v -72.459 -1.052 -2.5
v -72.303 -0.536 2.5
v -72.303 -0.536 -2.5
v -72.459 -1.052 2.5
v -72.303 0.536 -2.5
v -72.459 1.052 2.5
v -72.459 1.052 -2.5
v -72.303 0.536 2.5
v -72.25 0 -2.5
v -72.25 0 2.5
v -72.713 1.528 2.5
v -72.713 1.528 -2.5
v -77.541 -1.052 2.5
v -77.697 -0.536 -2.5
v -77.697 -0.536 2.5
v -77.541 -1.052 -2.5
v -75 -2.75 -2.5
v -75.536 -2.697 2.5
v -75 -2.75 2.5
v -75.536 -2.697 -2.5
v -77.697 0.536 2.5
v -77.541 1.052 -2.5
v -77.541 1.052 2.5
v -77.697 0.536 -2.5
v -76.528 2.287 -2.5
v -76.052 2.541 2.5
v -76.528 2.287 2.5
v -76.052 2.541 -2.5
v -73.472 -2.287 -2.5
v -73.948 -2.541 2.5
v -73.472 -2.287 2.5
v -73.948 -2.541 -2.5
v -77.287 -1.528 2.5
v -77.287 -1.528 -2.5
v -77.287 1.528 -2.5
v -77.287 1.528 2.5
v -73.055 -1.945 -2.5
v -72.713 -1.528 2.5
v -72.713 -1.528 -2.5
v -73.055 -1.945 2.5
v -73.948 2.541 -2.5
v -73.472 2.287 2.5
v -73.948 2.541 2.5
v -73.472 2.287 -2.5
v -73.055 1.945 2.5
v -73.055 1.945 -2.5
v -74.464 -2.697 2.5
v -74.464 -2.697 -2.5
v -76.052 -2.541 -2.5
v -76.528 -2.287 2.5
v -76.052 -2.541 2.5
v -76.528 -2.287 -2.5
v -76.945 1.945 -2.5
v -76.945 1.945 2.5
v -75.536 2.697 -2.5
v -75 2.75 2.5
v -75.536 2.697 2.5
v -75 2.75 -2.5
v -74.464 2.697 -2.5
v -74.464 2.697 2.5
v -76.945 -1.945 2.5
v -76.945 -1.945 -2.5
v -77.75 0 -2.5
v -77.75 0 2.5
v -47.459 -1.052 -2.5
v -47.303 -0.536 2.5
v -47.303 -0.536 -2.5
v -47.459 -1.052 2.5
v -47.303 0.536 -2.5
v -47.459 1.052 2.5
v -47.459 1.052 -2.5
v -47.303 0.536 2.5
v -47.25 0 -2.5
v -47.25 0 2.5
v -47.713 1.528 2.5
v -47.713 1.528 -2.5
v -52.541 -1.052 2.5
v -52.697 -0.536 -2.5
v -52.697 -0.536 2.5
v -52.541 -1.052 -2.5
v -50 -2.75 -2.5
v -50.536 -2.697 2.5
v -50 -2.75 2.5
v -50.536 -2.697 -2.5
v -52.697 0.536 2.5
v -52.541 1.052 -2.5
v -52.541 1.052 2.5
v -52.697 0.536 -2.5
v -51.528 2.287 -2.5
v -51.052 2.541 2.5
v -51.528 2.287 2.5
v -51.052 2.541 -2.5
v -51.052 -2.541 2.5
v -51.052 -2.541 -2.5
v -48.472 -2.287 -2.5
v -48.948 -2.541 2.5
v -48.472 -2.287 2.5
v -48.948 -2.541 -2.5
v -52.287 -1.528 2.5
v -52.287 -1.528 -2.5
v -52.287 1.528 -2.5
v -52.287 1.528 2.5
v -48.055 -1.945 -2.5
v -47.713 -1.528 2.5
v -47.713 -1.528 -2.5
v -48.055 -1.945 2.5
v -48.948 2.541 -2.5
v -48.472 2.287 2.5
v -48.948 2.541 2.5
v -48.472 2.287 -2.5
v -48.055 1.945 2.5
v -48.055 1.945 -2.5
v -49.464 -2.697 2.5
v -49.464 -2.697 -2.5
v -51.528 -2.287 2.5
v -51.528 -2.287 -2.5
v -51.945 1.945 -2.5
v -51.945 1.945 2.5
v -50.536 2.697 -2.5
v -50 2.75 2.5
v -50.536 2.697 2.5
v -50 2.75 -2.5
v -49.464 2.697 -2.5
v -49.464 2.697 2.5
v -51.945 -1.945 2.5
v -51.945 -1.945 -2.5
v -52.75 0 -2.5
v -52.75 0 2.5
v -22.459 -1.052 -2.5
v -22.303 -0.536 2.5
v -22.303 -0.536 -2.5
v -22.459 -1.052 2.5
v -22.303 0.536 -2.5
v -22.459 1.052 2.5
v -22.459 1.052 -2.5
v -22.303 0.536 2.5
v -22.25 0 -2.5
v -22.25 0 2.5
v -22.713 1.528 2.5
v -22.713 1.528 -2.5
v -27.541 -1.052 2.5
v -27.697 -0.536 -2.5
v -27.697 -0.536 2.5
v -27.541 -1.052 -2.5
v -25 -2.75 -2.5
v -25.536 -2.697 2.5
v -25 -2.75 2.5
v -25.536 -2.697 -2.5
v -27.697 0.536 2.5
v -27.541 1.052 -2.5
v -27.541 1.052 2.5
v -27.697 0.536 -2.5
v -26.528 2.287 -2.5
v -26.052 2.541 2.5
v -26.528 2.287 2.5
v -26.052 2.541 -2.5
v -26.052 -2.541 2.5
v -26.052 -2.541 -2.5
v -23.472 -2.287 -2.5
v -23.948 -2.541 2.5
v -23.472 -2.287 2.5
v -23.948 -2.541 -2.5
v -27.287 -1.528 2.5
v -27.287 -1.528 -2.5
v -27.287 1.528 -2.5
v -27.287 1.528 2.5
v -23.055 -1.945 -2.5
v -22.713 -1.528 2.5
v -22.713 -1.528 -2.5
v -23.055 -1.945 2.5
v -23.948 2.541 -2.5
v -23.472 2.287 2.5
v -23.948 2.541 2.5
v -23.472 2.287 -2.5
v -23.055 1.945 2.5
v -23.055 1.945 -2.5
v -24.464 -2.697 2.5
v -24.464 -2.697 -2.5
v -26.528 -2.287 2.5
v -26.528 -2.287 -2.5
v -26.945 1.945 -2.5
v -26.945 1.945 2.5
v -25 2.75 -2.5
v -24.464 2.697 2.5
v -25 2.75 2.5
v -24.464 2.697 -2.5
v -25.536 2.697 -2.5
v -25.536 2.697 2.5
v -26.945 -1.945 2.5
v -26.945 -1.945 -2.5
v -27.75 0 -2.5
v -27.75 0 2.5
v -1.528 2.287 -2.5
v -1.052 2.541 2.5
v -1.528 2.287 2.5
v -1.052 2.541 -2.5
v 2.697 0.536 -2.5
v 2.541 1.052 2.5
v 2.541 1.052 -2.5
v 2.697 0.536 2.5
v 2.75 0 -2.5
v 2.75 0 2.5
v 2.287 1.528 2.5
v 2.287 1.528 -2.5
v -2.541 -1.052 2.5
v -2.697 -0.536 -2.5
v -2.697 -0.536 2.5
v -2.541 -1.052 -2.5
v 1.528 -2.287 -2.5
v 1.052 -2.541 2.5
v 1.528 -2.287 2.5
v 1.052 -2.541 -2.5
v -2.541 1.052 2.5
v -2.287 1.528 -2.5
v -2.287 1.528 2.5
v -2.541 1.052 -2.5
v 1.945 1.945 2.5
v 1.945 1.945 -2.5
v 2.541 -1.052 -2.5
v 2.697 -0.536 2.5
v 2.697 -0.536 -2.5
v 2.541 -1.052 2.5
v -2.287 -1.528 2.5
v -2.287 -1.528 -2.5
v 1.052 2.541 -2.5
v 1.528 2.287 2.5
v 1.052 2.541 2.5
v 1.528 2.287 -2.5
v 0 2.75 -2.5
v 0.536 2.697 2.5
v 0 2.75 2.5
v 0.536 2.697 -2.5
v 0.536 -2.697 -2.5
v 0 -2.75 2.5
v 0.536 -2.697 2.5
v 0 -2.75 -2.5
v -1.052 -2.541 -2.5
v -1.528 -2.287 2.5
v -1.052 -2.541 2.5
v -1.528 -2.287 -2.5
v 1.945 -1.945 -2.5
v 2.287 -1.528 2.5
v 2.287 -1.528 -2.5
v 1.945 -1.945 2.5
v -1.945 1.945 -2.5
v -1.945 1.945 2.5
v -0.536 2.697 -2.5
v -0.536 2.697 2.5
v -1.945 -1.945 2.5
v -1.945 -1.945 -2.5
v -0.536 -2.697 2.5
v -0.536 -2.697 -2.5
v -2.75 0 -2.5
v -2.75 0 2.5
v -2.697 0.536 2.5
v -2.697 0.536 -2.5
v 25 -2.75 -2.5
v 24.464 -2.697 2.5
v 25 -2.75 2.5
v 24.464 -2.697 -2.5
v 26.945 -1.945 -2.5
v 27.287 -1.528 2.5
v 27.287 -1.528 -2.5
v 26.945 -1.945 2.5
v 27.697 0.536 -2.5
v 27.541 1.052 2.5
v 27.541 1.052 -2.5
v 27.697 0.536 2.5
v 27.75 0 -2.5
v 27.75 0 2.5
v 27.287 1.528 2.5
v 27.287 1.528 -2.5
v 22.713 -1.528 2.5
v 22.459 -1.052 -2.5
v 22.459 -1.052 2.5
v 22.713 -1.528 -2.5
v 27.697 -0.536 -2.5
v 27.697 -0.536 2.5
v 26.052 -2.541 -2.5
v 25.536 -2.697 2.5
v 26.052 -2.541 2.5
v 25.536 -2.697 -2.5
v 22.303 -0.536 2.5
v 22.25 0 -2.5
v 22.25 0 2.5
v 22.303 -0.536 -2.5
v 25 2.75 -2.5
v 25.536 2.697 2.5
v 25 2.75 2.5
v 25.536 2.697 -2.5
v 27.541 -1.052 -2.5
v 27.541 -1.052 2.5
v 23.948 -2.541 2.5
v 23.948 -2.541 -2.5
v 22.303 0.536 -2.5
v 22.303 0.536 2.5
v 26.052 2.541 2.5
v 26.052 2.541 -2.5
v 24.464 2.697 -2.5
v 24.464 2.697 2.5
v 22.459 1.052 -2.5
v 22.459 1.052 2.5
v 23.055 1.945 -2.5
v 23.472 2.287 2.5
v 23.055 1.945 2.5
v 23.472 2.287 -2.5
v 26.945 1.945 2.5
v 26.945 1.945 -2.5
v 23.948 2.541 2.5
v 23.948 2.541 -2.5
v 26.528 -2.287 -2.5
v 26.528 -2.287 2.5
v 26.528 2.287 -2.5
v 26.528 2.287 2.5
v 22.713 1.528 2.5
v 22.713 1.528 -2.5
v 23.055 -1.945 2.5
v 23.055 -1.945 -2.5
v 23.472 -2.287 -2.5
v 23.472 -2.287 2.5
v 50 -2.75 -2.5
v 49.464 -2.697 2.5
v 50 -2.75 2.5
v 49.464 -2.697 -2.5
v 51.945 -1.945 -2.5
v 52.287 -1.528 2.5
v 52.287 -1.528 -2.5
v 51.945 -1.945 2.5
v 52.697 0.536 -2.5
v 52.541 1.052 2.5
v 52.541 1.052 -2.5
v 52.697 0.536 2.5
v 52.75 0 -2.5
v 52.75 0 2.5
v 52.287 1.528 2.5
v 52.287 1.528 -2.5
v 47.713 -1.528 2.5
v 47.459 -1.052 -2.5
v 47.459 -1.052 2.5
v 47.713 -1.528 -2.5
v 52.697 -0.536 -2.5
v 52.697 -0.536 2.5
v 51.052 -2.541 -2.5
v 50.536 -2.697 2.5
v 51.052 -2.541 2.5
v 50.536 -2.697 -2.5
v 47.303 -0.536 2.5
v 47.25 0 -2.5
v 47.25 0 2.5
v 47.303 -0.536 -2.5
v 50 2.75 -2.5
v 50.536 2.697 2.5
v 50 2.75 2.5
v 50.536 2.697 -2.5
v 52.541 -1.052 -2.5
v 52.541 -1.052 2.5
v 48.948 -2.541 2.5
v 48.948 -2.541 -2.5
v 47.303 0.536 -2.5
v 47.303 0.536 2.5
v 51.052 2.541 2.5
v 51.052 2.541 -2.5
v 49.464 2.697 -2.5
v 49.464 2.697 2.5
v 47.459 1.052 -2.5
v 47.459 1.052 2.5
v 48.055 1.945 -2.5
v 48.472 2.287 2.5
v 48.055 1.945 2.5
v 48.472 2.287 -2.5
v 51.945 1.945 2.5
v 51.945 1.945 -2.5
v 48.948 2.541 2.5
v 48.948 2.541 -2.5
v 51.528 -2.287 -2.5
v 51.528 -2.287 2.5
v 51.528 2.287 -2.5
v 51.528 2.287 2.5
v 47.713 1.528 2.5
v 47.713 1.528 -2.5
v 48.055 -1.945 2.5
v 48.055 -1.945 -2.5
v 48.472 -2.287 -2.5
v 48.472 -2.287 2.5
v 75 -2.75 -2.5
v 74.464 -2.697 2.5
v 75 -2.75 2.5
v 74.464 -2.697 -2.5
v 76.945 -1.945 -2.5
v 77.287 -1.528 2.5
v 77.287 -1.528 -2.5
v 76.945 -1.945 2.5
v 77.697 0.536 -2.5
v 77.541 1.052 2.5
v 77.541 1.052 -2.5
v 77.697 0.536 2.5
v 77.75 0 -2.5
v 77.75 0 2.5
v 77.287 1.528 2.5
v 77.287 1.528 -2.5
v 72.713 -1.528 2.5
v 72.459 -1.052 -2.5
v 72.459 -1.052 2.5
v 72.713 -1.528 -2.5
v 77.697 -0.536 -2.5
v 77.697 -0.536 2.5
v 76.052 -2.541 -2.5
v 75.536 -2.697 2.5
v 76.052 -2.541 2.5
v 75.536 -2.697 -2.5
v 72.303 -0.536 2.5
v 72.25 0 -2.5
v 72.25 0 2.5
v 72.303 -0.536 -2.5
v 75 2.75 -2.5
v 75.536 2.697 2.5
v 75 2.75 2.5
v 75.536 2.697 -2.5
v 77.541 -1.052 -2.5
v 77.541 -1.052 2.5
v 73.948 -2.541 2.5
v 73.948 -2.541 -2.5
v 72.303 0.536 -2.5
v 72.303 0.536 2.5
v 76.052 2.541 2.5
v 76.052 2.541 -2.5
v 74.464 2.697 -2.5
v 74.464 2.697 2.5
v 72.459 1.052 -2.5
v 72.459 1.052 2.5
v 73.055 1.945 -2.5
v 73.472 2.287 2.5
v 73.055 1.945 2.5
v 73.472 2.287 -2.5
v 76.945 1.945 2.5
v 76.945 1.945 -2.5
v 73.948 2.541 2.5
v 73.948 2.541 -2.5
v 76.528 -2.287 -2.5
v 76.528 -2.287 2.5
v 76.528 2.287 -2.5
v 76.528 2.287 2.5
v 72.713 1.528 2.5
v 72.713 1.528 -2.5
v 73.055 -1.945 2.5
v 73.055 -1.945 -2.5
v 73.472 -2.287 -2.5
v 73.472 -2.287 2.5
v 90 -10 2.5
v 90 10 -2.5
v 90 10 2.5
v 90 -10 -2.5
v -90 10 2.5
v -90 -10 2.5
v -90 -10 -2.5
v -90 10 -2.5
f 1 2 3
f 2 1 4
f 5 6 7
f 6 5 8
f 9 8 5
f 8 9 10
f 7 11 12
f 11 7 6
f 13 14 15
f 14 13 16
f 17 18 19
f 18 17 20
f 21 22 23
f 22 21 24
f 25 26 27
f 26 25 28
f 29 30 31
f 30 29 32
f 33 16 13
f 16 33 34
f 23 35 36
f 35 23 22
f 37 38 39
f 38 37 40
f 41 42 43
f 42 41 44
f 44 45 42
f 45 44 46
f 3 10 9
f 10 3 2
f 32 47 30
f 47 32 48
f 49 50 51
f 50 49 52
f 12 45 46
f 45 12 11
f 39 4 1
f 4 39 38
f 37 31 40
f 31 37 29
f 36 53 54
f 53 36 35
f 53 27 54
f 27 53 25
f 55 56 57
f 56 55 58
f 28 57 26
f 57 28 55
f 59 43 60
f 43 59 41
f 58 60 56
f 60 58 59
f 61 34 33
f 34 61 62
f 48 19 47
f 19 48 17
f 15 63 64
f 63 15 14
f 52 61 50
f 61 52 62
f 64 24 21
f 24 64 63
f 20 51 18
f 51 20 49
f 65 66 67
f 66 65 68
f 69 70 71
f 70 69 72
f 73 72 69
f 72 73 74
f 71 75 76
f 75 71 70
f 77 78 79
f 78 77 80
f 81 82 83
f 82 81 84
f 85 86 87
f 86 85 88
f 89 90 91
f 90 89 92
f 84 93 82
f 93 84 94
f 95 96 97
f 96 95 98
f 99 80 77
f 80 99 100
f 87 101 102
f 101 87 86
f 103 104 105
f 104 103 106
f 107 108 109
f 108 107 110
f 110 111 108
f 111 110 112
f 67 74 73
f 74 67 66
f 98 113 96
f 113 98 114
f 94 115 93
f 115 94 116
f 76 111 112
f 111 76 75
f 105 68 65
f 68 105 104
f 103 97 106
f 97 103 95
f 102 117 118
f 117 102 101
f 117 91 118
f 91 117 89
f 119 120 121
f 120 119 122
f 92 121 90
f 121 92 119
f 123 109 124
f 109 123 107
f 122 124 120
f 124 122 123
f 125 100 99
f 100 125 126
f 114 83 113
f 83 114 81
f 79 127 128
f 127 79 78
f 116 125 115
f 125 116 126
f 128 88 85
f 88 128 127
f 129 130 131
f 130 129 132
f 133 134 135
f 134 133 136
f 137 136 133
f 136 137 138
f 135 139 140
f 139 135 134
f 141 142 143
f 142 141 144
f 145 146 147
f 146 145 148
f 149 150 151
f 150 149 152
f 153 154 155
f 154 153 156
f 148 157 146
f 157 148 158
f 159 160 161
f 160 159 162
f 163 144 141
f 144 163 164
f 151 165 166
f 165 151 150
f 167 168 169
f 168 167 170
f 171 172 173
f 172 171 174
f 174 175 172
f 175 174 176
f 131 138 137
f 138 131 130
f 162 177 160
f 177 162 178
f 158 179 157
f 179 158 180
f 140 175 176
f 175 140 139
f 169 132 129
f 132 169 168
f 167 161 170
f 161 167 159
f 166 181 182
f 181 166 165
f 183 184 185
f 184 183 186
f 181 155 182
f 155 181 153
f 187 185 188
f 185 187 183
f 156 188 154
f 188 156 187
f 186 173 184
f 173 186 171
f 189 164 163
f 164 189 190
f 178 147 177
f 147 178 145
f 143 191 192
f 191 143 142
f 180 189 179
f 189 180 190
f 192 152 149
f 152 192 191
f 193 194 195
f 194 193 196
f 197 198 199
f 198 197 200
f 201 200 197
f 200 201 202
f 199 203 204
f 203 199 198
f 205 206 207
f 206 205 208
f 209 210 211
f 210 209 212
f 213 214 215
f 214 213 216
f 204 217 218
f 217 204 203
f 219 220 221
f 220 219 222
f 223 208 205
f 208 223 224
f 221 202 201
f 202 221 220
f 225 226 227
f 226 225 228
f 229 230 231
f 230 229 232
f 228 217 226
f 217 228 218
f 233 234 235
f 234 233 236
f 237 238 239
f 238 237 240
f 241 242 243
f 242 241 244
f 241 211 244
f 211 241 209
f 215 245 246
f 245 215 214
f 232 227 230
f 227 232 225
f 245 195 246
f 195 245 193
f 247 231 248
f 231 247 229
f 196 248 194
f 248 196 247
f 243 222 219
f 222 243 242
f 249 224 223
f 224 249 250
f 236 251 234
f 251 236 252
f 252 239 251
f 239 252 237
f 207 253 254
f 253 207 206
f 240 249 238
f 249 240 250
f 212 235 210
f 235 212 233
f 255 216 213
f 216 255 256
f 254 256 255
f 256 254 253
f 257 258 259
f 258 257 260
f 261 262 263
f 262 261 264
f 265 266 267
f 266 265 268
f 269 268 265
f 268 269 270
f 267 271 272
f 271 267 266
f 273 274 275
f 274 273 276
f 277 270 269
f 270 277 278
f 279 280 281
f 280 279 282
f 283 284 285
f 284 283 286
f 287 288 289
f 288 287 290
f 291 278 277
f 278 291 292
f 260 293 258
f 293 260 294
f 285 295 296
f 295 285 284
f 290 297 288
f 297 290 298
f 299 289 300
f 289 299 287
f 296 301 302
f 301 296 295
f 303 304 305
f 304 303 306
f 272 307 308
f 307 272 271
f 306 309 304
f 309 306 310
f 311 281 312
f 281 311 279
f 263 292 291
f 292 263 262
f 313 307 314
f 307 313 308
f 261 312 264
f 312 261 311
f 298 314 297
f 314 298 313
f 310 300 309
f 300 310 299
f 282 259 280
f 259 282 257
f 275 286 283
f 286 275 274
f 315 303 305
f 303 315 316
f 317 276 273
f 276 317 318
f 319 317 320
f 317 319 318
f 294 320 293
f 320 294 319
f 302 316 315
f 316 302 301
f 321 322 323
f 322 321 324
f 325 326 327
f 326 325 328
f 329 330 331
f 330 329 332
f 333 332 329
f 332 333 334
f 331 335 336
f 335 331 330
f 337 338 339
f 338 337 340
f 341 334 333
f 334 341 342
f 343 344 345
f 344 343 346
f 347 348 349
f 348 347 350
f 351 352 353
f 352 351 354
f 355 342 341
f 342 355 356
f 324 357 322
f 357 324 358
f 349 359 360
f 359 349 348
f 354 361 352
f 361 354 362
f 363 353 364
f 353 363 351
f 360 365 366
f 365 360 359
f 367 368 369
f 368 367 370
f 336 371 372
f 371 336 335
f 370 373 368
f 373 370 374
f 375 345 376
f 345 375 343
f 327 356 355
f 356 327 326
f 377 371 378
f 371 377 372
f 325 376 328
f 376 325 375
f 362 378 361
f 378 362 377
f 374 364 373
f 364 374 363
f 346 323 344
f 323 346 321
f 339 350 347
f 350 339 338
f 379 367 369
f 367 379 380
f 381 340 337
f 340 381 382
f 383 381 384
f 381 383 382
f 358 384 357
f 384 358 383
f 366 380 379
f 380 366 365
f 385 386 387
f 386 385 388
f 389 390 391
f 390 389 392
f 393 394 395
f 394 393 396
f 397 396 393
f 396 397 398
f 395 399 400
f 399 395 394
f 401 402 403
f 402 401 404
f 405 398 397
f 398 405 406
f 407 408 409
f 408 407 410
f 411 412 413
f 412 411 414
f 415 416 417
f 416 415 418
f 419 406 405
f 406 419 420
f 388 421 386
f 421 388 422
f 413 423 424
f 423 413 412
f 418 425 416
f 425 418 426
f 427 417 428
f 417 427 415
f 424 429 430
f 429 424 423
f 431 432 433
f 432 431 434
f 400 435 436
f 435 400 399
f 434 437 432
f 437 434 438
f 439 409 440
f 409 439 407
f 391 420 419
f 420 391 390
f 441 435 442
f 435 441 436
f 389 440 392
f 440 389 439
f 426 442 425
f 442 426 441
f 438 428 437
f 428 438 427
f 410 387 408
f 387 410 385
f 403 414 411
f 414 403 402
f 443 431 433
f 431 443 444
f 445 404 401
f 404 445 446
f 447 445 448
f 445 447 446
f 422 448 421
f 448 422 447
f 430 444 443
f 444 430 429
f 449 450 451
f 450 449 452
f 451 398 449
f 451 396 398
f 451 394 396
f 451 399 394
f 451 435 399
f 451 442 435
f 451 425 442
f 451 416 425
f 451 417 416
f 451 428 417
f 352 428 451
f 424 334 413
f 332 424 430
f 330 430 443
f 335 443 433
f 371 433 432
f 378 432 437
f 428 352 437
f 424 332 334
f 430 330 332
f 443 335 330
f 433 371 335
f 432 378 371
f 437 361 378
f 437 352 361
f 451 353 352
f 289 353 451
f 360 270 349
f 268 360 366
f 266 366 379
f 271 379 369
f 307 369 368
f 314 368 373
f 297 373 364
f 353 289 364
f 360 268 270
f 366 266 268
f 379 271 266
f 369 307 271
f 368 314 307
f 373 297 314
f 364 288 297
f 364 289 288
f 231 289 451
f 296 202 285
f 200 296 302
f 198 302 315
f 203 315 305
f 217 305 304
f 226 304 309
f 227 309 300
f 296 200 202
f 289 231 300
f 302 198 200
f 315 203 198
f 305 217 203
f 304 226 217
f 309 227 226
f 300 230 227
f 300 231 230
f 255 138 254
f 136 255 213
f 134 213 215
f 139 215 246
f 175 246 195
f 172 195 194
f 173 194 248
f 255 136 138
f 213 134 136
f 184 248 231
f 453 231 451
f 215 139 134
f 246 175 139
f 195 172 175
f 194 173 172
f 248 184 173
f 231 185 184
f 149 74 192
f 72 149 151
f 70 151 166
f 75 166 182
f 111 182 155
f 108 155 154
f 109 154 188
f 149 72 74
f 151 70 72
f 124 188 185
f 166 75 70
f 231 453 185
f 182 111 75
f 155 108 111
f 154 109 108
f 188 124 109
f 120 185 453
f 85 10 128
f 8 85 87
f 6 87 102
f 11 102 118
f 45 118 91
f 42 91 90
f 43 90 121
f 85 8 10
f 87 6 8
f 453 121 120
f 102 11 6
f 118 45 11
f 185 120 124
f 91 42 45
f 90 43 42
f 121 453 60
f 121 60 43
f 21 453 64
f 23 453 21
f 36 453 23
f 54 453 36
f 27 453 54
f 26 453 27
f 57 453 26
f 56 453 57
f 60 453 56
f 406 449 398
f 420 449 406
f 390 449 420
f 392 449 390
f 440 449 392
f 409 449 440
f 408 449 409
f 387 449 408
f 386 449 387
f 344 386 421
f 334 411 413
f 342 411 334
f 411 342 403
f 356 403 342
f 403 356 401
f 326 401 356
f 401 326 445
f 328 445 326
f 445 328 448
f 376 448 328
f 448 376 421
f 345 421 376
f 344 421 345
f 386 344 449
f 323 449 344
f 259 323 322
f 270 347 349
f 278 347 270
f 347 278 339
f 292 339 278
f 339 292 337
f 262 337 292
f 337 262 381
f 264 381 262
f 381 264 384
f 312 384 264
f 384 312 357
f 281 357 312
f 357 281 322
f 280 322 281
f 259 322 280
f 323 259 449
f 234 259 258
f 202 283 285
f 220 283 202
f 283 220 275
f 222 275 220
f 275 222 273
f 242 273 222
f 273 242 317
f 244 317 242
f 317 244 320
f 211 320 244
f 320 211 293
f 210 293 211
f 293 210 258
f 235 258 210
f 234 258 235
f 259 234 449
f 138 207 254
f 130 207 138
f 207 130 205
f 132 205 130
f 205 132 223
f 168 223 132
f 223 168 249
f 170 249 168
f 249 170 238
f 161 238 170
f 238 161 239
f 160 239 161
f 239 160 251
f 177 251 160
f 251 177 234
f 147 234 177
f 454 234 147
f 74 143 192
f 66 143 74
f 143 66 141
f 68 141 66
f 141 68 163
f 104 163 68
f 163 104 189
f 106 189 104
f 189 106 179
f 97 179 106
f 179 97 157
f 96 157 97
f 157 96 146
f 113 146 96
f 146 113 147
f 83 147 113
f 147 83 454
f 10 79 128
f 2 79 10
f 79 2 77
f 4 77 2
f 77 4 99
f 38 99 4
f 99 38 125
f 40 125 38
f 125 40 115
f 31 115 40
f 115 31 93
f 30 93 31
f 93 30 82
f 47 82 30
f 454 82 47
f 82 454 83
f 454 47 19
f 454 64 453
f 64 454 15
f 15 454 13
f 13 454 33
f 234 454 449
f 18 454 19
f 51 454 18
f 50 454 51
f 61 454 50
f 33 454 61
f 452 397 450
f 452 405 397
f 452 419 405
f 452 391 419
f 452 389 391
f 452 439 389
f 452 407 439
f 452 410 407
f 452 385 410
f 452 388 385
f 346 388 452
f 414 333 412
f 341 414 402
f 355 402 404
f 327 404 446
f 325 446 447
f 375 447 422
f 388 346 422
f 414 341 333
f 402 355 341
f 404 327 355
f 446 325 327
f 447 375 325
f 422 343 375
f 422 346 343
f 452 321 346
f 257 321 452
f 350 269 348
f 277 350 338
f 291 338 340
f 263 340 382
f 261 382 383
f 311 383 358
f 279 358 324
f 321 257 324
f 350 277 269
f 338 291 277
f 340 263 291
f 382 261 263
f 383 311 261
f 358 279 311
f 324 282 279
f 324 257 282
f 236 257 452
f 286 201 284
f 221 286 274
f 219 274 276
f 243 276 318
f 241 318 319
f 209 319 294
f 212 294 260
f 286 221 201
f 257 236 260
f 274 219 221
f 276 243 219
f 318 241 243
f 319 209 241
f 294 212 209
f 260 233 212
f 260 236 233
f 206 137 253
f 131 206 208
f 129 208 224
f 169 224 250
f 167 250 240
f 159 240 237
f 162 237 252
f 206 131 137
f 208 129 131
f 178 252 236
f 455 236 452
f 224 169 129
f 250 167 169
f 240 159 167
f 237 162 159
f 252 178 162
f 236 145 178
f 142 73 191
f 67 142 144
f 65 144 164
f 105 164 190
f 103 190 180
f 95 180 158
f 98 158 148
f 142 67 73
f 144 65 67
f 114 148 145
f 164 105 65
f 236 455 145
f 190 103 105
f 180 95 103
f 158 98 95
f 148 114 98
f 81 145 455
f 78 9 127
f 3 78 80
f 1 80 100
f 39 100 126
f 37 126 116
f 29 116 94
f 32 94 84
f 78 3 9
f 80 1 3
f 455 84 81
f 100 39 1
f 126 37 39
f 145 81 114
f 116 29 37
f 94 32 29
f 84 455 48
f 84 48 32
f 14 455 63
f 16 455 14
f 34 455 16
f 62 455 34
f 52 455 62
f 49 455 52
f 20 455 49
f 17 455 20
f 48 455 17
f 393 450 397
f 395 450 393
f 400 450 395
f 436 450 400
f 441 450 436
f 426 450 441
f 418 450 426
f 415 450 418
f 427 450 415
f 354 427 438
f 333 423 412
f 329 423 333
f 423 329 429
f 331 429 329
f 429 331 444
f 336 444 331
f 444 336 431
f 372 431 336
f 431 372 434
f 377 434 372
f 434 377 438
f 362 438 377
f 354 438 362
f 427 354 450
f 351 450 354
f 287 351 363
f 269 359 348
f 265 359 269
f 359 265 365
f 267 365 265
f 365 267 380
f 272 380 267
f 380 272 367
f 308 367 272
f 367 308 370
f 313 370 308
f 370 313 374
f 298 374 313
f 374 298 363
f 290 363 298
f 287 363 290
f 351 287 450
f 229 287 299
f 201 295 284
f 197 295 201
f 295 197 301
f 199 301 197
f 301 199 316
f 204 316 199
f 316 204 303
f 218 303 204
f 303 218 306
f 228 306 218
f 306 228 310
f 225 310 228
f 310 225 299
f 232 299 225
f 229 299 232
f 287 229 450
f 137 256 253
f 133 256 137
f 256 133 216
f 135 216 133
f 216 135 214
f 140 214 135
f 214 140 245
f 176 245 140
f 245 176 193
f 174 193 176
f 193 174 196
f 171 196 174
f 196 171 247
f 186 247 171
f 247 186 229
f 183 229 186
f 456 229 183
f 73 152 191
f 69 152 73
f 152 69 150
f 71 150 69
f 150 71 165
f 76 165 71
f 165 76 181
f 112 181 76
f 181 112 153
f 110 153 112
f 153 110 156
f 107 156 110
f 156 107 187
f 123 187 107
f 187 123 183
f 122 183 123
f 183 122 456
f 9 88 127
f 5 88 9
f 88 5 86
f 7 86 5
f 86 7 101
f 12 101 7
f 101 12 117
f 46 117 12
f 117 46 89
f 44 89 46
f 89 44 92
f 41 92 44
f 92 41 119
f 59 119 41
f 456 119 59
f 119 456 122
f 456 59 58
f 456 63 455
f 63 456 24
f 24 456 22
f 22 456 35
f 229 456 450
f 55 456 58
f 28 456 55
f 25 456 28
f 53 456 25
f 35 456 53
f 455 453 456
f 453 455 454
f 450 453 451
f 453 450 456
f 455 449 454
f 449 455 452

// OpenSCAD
$fn = 32;

// ----------------------------------------------------------------------
// Hole bar, 7 x Ø5.5
// row layout, 15 mm edge offset
// ----------------------------------------------------------------------

// --- parameters (mm) ---
bar_w = 20;    // bar width (Y)
bar_t = 5;     // bar thickness (Z)
holes = 7;     // holes per row
hole_d = 5.5;  // hole diameter
edge = 15;     // offset from the bar end to the first hole
pitch = 25;    // pitch between neighbouring holes

// --- derived feature positions (mm) ---
span = (holes - 1) * pitch;   // = 150   distance between the end holes
bar_l = span + 2 * edge;      // = 180   overall bar length
start_x = -bar_l / 2 + edge;  // = -75   X of the first hole
feature_centers = [
  [start_x + 0 * pitch, 0],
  [start_x + 1 * pitch, 0],
  [start_x + 2 * pitch, 0],
  [start_x + 3 * pitch, 0],
  [start_x + 4 * pitch, 0],
  [start_x + 5 * pitch, 0],
  [start_x + 6 * pitch, 0]
];   // hole centres of the first row

// bar with one row of holes, drilled from feature_centers
difference() {
  translate([-bar_l / 2, -bar_w / 2, -bar_t / 2]) cube([bar_l, bar_w, bar_t]);
  for (centre = feature_centers)
    translate([centre[0], centre[1], 0])
      cylinder(d = hole_d, h = bar_t + 2, center = true);
}
